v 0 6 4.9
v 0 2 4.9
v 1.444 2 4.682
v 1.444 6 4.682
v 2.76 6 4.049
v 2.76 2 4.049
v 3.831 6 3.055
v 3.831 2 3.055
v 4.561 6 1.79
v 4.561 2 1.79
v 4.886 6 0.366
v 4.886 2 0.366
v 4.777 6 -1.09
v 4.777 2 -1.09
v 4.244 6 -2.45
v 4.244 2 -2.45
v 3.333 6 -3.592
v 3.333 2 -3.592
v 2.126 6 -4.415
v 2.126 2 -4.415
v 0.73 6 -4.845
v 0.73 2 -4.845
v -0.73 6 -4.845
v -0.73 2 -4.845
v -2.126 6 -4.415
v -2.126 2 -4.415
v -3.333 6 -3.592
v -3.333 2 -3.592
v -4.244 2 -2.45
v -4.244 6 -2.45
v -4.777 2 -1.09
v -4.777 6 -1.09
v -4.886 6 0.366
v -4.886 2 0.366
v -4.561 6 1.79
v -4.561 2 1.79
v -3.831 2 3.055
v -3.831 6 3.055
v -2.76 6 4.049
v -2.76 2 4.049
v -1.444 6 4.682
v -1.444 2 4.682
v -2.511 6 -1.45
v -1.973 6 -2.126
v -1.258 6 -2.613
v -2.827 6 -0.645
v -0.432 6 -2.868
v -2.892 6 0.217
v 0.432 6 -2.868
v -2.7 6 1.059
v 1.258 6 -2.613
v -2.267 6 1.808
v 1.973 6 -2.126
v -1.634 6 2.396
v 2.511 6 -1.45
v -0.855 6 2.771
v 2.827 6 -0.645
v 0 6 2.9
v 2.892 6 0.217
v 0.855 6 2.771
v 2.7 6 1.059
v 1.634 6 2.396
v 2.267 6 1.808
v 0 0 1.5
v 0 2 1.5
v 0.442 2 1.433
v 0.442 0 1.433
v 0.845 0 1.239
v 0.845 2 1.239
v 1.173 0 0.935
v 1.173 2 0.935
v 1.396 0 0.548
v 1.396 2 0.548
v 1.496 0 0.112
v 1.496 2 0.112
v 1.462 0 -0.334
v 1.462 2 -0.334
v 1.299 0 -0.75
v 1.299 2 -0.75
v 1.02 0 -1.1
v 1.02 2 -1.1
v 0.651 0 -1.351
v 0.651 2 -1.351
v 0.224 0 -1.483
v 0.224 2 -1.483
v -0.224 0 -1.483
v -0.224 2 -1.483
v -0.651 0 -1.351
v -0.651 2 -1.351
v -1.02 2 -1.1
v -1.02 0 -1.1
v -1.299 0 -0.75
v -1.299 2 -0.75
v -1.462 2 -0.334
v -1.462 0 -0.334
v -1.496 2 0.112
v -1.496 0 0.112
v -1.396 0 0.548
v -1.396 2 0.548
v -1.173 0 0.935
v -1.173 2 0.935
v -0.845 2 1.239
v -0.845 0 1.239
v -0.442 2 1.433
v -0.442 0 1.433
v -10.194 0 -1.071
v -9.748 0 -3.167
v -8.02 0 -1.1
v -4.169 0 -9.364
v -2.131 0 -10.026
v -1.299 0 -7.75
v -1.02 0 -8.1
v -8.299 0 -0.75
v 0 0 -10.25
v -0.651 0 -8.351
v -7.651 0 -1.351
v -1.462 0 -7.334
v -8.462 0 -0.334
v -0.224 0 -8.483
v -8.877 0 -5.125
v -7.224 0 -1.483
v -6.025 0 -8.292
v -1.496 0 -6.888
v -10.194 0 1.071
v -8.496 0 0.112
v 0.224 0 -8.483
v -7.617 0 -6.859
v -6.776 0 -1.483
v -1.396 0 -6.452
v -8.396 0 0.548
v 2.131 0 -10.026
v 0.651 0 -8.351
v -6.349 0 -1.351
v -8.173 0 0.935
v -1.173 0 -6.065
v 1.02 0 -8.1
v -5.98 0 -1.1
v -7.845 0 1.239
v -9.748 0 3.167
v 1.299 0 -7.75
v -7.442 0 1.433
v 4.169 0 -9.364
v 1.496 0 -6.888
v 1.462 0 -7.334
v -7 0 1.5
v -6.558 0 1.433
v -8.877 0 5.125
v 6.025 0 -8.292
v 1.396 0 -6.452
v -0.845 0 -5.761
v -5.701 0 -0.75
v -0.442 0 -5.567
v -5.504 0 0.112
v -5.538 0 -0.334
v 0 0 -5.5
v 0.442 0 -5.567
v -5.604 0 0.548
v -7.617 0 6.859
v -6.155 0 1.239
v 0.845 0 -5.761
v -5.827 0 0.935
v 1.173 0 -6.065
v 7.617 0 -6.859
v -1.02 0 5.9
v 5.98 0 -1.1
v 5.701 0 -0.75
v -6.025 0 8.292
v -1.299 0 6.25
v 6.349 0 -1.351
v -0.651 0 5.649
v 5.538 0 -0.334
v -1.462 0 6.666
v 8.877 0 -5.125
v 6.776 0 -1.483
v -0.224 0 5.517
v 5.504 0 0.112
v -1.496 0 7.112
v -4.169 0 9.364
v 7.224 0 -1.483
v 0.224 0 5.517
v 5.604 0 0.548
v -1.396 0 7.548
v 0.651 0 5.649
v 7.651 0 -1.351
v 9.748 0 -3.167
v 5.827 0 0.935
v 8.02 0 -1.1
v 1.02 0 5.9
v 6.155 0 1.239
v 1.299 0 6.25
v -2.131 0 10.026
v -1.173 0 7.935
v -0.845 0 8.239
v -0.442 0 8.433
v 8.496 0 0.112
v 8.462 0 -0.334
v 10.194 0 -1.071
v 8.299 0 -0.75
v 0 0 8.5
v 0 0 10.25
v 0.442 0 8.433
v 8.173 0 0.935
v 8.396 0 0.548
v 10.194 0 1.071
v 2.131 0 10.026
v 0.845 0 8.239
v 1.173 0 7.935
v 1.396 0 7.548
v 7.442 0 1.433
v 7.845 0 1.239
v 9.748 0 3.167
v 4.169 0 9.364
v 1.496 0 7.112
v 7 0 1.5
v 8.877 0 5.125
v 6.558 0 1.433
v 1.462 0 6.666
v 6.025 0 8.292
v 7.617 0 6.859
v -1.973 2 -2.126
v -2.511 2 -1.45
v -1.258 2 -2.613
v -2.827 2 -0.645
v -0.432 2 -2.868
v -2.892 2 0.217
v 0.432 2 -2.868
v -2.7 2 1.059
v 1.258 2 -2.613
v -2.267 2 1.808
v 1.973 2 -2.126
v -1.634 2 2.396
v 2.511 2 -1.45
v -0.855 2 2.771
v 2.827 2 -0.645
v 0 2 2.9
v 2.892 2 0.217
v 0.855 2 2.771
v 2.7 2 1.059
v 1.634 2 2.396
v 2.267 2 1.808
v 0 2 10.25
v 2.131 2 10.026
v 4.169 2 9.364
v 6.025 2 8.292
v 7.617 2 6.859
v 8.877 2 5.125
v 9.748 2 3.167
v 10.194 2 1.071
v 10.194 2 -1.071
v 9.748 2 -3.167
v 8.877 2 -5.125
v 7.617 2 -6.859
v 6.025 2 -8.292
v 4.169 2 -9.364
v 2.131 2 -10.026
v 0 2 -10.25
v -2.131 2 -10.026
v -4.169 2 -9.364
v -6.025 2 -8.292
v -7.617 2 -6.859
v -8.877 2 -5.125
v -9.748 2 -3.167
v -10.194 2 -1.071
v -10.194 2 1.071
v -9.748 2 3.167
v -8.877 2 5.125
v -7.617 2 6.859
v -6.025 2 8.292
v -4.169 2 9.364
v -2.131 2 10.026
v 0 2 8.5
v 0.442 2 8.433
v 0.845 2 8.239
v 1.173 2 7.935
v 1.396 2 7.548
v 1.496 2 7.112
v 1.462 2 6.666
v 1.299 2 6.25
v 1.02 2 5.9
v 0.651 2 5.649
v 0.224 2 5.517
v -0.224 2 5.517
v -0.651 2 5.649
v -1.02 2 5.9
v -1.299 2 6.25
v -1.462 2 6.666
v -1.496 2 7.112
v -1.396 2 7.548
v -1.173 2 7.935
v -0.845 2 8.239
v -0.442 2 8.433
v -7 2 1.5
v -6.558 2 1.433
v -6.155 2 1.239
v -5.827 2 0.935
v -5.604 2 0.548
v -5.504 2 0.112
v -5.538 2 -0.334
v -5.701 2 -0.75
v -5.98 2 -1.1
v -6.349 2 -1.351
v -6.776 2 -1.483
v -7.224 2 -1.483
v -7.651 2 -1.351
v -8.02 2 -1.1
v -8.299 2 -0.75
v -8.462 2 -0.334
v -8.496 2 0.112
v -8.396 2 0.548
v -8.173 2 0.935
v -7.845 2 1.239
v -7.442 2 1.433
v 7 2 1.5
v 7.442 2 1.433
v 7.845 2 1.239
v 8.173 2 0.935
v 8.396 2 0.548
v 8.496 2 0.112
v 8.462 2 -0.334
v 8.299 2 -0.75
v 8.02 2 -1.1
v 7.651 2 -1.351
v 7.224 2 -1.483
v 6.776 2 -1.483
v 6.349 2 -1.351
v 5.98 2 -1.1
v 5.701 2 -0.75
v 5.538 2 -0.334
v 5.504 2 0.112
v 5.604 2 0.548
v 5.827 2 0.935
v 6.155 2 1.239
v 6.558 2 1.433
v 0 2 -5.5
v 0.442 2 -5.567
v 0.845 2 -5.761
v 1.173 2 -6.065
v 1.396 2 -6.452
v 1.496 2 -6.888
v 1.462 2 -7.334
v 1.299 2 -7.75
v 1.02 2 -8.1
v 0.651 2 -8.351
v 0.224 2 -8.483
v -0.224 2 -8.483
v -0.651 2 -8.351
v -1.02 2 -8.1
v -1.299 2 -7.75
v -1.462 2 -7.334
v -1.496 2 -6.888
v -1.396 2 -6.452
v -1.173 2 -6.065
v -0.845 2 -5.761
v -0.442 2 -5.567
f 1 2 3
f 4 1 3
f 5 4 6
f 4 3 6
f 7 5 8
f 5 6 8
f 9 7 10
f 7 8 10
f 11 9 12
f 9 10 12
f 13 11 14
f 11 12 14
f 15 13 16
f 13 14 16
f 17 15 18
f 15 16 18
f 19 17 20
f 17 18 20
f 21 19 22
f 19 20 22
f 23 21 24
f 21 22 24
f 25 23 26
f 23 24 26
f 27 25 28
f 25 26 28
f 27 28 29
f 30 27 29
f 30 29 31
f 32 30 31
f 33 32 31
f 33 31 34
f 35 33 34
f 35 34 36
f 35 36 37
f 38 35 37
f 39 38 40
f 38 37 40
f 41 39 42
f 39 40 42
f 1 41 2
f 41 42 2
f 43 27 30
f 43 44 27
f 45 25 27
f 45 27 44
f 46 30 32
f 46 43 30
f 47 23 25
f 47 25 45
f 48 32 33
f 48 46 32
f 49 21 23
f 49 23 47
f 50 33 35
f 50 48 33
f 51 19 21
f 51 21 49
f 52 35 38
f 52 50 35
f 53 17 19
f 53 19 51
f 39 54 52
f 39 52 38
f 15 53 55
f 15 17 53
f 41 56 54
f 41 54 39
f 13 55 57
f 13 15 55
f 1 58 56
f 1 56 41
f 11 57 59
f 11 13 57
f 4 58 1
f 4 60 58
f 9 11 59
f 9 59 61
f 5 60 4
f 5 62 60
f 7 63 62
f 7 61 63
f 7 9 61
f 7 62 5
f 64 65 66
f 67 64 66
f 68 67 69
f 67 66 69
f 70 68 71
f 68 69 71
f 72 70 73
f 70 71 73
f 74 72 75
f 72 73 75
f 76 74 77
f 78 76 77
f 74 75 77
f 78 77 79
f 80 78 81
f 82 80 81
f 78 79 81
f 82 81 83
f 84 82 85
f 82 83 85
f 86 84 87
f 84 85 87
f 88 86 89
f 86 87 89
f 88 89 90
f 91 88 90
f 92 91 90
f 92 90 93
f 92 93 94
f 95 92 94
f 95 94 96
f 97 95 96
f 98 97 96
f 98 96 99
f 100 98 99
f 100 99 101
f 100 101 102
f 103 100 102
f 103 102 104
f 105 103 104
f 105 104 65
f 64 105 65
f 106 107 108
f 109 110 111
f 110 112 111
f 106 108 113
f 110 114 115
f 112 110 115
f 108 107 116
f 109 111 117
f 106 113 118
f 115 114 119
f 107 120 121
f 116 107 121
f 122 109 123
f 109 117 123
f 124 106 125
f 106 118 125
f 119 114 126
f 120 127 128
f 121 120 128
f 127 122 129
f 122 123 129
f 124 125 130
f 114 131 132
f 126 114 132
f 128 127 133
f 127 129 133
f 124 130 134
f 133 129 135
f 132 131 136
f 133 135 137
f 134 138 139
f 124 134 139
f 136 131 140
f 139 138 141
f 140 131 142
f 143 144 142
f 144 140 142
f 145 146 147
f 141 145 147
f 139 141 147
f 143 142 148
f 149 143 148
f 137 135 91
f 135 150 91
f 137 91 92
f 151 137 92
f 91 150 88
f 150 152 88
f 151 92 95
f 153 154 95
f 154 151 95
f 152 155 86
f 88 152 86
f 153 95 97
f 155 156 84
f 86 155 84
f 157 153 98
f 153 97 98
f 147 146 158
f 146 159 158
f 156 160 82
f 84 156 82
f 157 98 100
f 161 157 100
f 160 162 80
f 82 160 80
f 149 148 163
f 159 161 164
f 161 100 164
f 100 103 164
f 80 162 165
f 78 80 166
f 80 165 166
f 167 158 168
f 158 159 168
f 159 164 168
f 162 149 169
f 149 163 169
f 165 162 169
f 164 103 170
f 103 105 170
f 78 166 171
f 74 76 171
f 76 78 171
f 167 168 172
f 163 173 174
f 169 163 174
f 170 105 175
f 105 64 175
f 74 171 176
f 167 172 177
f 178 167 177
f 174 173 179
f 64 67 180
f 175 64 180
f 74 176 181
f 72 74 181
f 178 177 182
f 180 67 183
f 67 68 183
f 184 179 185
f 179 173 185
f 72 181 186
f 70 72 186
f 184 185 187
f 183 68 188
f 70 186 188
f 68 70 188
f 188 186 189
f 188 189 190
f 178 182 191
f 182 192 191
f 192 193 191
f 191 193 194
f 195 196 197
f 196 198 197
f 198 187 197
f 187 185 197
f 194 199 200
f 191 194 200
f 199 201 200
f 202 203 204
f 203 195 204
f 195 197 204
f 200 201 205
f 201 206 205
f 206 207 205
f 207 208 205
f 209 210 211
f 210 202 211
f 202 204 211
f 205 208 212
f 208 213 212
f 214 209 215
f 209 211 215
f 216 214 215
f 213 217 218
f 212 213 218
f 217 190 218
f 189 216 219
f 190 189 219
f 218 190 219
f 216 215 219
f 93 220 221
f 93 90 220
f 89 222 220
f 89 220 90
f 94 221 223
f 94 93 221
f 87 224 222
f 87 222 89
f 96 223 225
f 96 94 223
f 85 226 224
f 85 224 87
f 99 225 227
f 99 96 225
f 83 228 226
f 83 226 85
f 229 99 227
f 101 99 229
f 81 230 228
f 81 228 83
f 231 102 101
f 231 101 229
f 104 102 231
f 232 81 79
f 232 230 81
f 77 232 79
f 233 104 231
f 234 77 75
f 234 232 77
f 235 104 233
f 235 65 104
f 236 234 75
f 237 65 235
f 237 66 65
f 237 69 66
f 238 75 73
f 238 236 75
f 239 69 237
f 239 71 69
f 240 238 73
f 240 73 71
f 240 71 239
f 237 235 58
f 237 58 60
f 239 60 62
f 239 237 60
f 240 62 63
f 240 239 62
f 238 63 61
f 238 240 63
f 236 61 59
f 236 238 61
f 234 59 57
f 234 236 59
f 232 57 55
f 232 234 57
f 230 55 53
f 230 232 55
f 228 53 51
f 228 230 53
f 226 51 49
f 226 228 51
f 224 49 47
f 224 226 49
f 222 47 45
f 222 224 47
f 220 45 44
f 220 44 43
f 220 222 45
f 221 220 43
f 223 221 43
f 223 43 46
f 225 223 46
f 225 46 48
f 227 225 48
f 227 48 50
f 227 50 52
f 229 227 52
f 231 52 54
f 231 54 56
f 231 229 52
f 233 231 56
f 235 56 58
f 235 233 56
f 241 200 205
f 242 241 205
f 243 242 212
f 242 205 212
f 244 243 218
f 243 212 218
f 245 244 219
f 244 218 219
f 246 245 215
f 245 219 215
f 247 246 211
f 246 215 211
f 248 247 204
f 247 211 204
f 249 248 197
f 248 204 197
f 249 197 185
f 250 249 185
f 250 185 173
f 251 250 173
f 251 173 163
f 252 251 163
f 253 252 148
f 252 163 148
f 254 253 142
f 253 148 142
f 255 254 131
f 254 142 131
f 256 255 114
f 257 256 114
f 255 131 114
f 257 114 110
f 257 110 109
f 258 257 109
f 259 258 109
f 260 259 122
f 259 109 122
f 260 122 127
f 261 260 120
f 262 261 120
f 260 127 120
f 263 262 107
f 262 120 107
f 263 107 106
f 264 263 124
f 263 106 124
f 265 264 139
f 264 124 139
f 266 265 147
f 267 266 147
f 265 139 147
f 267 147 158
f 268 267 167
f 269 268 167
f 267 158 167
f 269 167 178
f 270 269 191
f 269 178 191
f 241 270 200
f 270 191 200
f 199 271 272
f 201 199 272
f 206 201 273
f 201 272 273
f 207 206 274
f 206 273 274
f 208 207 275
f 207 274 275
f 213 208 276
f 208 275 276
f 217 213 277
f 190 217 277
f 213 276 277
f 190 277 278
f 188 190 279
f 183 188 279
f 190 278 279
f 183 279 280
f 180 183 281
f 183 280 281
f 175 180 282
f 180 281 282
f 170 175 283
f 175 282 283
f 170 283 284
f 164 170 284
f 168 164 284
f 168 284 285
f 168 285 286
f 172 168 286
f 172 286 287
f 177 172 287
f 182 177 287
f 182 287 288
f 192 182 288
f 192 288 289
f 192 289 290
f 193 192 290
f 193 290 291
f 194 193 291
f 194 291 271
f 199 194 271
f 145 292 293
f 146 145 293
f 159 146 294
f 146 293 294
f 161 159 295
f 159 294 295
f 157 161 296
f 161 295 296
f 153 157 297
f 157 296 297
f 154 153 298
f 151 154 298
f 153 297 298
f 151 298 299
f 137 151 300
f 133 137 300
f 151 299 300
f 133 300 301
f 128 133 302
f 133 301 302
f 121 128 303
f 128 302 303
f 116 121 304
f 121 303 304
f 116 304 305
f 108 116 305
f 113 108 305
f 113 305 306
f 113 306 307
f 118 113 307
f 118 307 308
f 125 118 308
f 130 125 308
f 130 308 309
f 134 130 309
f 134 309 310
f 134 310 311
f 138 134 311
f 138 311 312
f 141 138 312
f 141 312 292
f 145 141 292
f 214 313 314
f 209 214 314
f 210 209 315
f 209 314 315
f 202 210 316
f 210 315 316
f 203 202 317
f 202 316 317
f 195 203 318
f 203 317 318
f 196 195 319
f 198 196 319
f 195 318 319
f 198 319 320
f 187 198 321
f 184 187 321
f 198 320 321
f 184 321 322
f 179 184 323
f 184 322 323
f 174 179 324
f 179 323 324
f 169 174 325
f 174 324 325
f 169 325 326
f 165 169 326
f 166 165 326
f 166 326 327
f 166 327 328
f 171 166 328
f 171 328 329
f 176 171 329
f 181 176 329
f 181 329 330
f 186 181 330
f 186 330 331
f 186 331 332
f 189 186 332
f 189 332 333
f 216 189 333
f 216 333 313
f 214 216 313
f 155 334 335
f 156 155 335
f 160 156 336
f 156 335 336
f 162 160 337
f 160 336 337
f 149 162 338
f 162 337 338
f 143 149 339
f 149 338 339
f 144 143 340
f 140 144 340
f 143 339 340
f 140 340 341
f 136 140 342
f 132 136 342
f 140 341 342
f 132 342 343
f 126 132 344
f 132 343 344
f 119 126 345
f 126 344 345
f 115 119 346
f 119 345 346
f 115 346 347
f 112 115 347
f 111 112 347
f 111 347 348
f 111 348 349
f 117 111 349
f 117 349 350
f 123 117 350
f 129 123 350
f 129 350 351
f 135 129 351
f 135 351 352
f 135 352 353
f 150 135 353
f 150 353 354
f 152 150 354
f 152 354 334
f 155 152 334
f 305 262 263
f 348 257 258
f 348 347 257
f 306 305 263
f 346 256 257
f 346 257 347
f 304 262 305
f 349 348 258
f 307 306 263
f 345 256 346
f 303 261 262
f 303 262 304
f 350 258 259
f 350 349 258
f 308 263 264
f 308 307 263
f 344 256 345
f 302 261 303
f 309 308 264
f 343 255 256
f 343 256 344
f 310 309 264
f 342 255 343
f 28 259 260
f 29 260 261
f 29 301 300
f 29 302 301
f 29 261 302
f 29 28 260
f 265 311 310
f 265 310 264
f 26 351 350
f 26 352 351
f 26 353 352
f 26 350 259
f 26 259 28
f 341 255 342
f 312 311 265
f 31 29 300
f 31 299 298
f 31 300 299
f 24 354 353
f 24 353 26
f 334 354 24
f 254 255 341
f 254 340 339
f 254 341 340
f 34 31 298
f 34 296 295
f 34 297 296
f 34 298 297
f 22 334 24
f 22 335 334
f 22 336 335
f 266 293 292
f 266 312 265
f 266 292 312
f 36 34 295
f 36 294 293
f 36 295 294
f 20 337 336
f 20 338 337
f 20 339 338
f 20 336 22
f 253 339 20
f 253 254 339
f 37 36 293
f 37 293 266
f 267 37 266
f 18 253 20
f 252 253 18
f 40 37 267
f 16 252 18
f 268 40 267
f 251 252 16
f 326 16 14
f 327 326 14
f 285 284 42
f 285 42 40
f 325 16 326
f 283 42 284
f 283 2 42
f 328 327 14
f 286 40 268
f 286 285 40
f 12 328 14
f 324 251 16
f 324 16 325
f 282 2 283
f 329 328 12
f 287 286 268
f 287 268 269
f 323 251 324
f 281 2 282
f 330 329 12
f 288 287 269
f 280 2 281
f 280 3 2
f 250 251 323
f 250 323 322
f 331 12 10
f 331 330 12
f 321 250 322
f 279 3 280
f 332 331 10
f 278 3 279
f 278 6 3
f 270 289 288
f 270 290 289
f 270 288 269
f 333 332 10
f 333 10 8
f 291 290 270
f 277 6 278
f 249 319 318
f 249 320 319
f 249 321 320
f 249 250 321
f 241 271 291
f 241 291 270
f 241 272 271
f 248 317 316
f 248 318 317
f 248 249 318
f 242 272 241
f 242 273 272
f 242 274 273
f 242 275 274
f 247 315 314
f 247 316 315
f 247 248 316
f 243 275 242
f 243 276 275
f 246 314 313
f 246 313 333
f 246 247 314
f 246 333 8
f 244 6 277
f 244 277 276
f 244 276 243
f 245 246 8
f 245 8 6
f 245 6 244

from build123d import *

# Parameters (mm, degrees)
SKETCH1_R           = 10.25
BOSS_EXTRUDE1_DEPTH = 2
SKETCH2_R           = 1.5
CUT_EXTRUDE1_DEPTH  = 3
SKETCH3_R           = 4.9
SKETCH3_R_2         = 2.9
BOSS_EXTRUDE2_DEPTH = 4


with BuildPart() as part:
    # Sketch1 → Boss-Extrude1 (new body)
    with BuildSketch(Plane(origin=(0, 0, 0), x_dir=(1, 0, 0), z_dir=(0, 1, 0))):
        with Locations(Location((0, 0, 0), (0, 0, 270))):
            Circle(SKETCH1_R)
    extrude(amount=BOSS_EXTRUDE1_DEPTH)

    # Sketch2 → Cut-Extrude1 (cut)
    with BuildSketch(Plane(origin=(0, 2, 0), x_dir=(1, 0, 0), z_dir=(0, 1, 0))):
        with Locations(Location((7, 0, 0), (0, 0, 270))):
            Circle(SKETCH2_R)
        with Locations(Location((0, 0, 0), (0, 0, 270))):
            Circle(SKETCH2_R)
        with Locations(Location((0, 7, 0), (0, 0, 270))):
            Circle(SKETCH2_R)
        with Locations(Location((-7, 0, 0), (0, 0, 270))):
            Circle(SKETCH2_R)
        with Locations(Location((0, -7, 0), (0, 0, 270))):
            Circle(SKETCH2_R)
    extrude(amount=-CUT_EXTRUDE1_DEPTH, mode=Mode.SUBTRACT)

    # Sketch3 → Boss-Extrude2 (add)
    with BuildSketch(Plane(origin=(0, 2, 0), x_dir=(1, 0, 0), z_dir=(0, 1, 0))):
        with Locations(Location((0, 0, 0), (0, 0, 270))):
            Circle(SKETCH3_R)
        with Locations(Location((0, 0, 0), (0, 0, 270))):
            Circle(SKETCH3_R_2, mode=Mode.SUBTRACT)
    extrude(amount=BOSS_EXTRUDE2_DEPTH)


solid = part.part
